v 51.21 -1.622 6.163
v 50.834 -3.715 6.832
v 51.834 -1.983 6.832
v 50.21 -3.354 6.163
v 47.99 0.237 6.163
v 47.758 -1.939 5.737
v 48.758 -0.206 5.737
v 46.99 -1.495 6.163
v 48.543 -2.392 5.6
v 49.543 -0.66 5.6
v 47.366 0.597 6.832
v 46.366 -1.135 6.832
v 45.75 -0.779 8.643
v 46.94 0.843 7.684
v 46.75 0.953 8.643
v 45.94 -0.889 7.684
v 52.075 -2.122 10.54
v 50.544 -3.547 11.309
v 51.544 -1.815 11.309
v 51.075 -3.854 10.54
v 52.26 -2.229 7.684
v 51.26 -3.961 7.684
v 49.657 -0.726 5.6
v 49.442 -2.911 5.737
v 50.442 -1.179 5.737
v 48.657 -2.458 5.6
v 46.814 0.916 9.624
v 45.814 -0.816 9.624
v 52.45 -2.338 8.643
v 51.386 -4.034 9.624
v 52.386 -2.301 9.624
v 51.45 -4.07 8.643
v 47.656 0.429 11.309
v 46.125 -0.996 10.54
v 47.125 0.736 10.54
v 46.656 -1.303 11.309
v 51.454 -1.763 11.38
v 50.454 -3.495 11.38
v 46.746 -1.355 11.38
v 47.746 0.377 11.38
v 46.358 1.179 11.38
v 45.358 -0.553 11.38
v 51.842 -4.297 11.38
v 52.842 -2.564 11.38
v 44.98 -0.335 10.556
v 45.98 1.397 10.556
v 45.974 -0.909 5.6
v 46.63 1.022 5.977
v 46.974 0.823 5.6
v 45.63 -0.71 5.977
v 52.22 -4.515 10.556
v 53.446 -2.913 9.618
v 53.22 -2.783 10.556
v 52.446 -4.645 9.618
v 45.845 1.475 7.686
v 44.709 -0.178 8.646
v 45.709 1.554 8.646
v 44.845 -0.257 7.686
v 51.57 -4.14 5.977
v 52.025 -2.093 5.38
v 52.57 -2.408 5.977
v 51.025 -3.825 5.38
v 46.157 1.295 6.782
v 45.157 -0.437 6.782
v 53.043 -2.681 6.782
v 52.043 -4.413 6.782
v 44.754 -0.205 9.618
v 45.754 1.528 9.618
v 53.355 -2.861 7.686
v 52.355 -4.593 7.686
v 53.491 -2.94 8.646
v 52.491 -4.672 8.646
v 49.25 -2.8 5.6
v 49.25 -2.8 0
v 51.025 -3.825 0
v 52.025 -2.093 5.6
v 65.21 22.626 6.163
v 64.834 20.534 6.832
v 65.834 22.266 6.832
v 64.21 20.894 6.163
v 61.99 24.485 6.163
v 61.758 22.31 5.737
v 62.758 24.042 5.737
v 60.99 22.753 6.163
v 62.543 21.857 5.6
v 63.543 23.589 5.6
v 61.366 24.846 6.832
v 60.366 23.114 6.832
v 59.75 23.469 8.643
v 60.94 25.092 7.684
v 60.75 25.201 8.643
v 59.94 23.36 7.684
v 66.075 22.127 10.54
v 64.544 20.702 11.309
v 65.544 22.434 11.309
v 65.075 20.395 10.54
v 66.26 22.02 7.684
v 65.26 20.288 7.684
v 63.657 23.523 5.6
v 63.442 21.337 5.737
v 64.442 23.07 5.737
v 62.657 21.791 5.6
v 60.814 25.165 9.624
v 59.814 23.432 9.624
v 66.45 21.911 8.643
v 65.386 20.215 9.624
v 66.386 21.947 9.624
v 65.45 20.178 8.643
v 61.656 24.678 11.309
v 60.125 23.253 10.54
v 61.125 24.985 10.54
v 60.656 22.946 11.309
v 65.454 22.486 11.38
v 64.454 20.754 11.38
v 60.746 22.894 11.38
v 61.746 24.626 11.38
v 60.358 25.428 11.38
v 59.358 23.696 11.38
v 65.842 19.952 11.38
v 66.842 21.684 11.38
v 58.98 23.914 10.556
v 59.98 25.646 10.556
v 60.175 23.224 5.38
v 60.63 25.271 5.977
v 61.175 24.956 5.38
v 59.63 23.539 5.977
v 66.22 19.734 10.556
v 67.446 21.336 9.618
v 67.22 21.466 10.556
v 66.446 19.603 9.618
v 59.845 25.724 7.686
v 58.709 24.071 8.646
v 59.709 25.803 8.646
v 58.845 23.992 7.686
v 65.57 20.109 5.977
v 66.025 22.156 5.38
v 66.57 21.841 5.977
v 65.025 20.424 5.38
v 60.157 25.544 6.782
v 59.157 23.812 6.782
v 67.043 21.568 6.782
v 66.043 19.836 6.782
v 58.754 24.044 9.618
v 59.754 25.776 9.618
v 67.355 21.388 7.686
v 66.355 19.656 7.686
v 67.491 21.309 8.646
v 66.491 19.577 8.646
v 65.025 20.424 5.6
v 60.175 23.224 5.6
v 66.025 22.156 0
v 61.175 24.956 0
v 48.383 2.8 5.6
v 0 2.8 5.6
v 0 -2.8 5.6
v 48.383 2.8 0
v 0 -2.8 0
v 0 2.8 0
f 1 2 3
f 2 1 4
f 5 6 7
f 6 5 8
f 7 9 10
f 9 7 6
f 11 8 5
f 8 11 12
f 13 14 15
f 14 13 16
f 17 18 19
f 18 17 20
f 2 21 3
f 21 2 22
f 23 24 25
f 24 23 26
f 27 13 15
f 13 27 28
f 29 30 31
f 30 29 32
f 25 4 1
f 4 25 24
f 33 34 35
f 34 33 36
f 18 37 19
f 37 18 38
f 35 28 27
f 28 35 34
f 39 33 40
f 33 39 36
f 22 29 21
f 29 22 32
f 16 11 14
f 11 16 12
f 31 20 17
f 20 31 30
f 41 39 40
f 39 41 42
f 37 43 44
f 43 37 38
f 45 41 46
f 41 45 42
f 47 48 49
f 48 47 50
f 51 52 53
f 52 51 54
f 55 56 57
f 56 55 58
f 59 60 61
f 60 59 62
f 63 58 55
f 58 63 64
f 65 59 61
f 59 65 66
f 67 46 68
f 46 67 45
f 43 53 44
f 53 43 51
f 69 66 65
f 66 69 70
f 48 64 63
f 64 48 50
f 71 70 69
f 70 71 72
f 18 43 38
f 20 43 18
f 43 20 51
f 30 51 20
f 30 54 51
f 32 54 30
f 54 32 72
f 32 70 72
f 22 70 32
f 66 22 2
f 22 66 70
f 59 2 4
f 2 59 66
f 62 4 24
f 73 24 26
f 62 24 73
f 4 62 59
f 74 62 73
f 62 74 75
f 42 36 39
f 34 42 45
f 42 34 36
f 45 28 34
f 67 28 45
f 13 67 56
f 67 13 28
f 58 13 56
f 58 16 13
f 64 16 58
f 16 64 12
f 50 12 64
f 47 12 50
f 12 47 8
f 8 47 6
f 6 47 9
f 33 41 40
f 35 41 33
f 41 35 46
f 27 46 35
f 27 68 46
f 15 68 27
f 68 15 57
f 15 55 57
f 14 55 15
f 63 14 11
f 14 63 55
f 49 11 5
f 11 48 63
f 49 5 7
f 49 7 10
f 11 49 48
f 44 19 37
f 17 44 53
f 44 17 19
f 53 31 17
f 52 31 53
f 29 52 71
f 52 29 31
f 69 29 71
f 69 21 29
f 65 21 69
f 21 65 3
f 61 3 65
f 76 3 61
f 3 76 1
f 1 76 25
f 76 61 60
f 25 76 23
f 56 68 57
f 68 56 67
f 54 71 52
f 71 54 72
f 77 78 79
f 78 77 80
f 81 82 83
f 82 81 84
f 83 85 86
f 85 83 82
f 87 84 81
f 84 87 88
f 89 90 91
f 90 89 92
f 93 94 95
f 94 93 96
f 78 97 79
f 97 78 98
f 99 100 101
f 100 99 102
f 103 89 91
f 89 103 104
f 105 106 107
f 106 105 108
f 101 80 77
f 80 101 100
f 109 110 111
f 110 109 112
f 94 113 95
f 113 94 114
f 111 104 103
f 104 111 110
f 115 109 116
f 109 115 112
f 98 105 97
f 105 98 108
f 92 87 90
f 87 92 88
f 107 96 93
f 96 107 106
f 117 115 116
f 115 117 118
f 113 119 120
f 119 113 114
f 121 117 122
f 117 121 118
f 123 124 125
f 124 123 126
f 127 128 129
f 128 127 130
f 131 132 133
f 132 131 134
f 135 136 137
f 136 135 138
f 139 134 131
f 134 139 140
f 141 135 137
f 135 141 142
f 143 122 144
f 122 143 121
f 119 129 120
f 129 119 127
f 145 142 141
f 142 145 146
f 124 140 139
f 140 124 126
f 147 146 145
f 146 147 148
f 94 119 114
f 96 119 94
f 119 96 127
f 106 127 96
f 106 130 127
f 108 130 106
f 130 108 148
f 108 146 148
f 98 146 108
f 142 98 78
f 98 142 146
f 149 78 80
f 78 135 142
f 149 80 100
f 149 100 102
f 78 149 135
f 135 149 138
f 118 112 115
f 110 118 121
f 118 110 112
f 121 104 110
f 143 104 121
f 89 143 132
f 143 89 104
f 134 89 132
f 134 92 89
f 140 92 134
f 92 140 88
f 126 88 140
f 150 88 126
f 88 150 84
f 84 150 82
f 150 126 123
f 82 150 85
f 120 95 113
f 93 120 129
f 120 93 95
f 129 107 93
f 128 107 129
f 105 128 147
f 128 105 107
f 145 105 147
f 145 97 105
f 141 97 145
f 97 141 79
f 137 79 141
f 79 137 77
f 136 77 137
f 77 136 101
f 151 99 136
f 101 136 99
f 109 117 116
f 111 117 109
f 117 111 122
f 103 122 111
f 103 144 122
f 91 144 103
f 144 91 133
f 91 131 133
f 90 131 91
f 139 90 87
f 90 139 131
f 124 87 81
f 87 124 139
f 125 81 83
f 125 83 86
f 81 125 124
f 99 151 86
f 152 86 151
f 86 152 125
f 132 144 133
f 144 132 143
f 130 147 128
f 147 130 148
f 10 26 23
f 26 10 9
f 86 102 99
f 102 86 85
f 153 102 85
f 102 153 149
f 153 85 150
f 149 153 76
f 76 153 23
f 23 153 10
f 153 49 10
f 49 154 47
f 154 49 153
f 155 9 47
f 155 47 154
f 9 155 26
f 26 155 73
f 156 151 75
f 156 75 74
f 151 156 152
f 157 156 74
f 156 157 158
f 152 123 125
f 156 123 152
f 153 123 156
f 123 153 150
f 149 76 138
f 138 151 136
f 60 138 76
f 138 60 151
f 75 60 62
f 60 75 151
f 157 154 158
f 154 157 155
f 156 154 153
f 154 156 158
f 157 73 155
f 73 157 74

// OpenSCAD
// -*- mode: SCAD ; c-file-style: "ellemtel" ; coding: utf-8 -*-
//
// NN
//
// © 2018–2019 Roland Sieker <ospalh@gmail.com>
// Licence: CC-BY-SA 4.0

/* [Global] */

// … to preview. You will get all parts as separate STLs when you click “Create Thing”.
part = "a"; // [s: Set, a: Zweiteilhalter, b: Part B]

// Set this to “render” and click on “Create Thing” when done with the setup.
preview = 1; // [0:render, 1:preview]

/* [Sizes] */

//
mic_angle = 30;  // [10:2.5:60]
l_h = 30;
h_h = 50;
w_h = 5.6;
l_hc = 2;
d_mic = 6.6;
g_h = 0.8;
/* [Hidden] */

// Done with the customizer

// *******************************************************
// Extra parameters. These can be changed reasonably safely.


w = 1.2;  // Wall width
p = 1.2;  // Bottom, top plate height
c = 0.4;  // Clearance
angle = 60; // Overhangs much below 60° are a problem for me

// *******************************************************
// Some shortcuts. These shouldn’t be changed

tau = 2 * PI;  // π is still wrong. τ = circumference / r

xy_factor = 1/tan(angle);
// To get from a height to a horizontal width inclined correctly
z_factor = tan(angle);  // The other way around

r_mic = d_mic/2;

some_distance = 50;
ms = 0.01;  // Muggeseggele.

// fn for differently sized objects and fs, fa; all for preview or rendering.
pna = 40;
pnb = 15;
pa = 5;
ps = 1;
rna = 180;
rnb = 30;
ra = 2;
rs = 0.25;
function na() = (preview) ? pna : rna;
function nb() = (preview) ? pnb : rnb;
$fs = (preview) ? ps : rs;
$fa = (preview) ? pa : ra;

// *******************************************************
// End setup



// *******************************************************
// Generate the parts

print_part();


if ("s" == part)
{
   preview_parts();
}

if ("st" == part)
{
   // Use "st" during development
   stack_parts();
}

module print_part()
{
   if ("a" == part)
   {
      zweiteil();
   }
}

module preview_parts()
{
   zweiteil();
   translate([some_distance, 0, 0])
   {
      part_b();
   }
}

module stack_parts()
{
   // intersection()
   {
      color("yellow")
      {
         zweiteil();
      }
      translate([0,0,30])
      {
         color("red")
         {
            part_b();
         }
      }
   }
}

// *******************************************************
// Code for the parts themselves

module zweiteil()
{
   translate([0, -w_h/2, 0])
   {
      cube([h_h, w_h, w_h]);
   }
   translate([h_h, 0, 0])
   {
      rotate(90-mic_angle)
      {
         translate([-w_h/2, -w_h/2, 0])
         {
            arm();
         }
      }
   }
}


module arm()
{
   cube([l_h, w_h, w_h]);
   translate([0,0,w_h-ms])
   {
      clip();
      translate([l_h-l_hc, 0, 0])
      {
         clip();
      }
   }
}


module clip()
{
   translate([0,w_h/2, r_mic])
   {
      rotate([0,90,0])
      {
         difference()
         {
            cylinder(r=r_mic+w, h=l_hc);
            translate([0,0,-ms])
            {
               cylinder(r=r_mic, h=l_hc+2*ms);
               translate([-w-d_mic+g_h,0,l_hc/2+ms])
               {
                  cube([d_mic+2*w+2*ms,d_mic+2*w+2*ms, l_hc+2*ms], center=true);
               }
            }
         }
      }
   }
}
